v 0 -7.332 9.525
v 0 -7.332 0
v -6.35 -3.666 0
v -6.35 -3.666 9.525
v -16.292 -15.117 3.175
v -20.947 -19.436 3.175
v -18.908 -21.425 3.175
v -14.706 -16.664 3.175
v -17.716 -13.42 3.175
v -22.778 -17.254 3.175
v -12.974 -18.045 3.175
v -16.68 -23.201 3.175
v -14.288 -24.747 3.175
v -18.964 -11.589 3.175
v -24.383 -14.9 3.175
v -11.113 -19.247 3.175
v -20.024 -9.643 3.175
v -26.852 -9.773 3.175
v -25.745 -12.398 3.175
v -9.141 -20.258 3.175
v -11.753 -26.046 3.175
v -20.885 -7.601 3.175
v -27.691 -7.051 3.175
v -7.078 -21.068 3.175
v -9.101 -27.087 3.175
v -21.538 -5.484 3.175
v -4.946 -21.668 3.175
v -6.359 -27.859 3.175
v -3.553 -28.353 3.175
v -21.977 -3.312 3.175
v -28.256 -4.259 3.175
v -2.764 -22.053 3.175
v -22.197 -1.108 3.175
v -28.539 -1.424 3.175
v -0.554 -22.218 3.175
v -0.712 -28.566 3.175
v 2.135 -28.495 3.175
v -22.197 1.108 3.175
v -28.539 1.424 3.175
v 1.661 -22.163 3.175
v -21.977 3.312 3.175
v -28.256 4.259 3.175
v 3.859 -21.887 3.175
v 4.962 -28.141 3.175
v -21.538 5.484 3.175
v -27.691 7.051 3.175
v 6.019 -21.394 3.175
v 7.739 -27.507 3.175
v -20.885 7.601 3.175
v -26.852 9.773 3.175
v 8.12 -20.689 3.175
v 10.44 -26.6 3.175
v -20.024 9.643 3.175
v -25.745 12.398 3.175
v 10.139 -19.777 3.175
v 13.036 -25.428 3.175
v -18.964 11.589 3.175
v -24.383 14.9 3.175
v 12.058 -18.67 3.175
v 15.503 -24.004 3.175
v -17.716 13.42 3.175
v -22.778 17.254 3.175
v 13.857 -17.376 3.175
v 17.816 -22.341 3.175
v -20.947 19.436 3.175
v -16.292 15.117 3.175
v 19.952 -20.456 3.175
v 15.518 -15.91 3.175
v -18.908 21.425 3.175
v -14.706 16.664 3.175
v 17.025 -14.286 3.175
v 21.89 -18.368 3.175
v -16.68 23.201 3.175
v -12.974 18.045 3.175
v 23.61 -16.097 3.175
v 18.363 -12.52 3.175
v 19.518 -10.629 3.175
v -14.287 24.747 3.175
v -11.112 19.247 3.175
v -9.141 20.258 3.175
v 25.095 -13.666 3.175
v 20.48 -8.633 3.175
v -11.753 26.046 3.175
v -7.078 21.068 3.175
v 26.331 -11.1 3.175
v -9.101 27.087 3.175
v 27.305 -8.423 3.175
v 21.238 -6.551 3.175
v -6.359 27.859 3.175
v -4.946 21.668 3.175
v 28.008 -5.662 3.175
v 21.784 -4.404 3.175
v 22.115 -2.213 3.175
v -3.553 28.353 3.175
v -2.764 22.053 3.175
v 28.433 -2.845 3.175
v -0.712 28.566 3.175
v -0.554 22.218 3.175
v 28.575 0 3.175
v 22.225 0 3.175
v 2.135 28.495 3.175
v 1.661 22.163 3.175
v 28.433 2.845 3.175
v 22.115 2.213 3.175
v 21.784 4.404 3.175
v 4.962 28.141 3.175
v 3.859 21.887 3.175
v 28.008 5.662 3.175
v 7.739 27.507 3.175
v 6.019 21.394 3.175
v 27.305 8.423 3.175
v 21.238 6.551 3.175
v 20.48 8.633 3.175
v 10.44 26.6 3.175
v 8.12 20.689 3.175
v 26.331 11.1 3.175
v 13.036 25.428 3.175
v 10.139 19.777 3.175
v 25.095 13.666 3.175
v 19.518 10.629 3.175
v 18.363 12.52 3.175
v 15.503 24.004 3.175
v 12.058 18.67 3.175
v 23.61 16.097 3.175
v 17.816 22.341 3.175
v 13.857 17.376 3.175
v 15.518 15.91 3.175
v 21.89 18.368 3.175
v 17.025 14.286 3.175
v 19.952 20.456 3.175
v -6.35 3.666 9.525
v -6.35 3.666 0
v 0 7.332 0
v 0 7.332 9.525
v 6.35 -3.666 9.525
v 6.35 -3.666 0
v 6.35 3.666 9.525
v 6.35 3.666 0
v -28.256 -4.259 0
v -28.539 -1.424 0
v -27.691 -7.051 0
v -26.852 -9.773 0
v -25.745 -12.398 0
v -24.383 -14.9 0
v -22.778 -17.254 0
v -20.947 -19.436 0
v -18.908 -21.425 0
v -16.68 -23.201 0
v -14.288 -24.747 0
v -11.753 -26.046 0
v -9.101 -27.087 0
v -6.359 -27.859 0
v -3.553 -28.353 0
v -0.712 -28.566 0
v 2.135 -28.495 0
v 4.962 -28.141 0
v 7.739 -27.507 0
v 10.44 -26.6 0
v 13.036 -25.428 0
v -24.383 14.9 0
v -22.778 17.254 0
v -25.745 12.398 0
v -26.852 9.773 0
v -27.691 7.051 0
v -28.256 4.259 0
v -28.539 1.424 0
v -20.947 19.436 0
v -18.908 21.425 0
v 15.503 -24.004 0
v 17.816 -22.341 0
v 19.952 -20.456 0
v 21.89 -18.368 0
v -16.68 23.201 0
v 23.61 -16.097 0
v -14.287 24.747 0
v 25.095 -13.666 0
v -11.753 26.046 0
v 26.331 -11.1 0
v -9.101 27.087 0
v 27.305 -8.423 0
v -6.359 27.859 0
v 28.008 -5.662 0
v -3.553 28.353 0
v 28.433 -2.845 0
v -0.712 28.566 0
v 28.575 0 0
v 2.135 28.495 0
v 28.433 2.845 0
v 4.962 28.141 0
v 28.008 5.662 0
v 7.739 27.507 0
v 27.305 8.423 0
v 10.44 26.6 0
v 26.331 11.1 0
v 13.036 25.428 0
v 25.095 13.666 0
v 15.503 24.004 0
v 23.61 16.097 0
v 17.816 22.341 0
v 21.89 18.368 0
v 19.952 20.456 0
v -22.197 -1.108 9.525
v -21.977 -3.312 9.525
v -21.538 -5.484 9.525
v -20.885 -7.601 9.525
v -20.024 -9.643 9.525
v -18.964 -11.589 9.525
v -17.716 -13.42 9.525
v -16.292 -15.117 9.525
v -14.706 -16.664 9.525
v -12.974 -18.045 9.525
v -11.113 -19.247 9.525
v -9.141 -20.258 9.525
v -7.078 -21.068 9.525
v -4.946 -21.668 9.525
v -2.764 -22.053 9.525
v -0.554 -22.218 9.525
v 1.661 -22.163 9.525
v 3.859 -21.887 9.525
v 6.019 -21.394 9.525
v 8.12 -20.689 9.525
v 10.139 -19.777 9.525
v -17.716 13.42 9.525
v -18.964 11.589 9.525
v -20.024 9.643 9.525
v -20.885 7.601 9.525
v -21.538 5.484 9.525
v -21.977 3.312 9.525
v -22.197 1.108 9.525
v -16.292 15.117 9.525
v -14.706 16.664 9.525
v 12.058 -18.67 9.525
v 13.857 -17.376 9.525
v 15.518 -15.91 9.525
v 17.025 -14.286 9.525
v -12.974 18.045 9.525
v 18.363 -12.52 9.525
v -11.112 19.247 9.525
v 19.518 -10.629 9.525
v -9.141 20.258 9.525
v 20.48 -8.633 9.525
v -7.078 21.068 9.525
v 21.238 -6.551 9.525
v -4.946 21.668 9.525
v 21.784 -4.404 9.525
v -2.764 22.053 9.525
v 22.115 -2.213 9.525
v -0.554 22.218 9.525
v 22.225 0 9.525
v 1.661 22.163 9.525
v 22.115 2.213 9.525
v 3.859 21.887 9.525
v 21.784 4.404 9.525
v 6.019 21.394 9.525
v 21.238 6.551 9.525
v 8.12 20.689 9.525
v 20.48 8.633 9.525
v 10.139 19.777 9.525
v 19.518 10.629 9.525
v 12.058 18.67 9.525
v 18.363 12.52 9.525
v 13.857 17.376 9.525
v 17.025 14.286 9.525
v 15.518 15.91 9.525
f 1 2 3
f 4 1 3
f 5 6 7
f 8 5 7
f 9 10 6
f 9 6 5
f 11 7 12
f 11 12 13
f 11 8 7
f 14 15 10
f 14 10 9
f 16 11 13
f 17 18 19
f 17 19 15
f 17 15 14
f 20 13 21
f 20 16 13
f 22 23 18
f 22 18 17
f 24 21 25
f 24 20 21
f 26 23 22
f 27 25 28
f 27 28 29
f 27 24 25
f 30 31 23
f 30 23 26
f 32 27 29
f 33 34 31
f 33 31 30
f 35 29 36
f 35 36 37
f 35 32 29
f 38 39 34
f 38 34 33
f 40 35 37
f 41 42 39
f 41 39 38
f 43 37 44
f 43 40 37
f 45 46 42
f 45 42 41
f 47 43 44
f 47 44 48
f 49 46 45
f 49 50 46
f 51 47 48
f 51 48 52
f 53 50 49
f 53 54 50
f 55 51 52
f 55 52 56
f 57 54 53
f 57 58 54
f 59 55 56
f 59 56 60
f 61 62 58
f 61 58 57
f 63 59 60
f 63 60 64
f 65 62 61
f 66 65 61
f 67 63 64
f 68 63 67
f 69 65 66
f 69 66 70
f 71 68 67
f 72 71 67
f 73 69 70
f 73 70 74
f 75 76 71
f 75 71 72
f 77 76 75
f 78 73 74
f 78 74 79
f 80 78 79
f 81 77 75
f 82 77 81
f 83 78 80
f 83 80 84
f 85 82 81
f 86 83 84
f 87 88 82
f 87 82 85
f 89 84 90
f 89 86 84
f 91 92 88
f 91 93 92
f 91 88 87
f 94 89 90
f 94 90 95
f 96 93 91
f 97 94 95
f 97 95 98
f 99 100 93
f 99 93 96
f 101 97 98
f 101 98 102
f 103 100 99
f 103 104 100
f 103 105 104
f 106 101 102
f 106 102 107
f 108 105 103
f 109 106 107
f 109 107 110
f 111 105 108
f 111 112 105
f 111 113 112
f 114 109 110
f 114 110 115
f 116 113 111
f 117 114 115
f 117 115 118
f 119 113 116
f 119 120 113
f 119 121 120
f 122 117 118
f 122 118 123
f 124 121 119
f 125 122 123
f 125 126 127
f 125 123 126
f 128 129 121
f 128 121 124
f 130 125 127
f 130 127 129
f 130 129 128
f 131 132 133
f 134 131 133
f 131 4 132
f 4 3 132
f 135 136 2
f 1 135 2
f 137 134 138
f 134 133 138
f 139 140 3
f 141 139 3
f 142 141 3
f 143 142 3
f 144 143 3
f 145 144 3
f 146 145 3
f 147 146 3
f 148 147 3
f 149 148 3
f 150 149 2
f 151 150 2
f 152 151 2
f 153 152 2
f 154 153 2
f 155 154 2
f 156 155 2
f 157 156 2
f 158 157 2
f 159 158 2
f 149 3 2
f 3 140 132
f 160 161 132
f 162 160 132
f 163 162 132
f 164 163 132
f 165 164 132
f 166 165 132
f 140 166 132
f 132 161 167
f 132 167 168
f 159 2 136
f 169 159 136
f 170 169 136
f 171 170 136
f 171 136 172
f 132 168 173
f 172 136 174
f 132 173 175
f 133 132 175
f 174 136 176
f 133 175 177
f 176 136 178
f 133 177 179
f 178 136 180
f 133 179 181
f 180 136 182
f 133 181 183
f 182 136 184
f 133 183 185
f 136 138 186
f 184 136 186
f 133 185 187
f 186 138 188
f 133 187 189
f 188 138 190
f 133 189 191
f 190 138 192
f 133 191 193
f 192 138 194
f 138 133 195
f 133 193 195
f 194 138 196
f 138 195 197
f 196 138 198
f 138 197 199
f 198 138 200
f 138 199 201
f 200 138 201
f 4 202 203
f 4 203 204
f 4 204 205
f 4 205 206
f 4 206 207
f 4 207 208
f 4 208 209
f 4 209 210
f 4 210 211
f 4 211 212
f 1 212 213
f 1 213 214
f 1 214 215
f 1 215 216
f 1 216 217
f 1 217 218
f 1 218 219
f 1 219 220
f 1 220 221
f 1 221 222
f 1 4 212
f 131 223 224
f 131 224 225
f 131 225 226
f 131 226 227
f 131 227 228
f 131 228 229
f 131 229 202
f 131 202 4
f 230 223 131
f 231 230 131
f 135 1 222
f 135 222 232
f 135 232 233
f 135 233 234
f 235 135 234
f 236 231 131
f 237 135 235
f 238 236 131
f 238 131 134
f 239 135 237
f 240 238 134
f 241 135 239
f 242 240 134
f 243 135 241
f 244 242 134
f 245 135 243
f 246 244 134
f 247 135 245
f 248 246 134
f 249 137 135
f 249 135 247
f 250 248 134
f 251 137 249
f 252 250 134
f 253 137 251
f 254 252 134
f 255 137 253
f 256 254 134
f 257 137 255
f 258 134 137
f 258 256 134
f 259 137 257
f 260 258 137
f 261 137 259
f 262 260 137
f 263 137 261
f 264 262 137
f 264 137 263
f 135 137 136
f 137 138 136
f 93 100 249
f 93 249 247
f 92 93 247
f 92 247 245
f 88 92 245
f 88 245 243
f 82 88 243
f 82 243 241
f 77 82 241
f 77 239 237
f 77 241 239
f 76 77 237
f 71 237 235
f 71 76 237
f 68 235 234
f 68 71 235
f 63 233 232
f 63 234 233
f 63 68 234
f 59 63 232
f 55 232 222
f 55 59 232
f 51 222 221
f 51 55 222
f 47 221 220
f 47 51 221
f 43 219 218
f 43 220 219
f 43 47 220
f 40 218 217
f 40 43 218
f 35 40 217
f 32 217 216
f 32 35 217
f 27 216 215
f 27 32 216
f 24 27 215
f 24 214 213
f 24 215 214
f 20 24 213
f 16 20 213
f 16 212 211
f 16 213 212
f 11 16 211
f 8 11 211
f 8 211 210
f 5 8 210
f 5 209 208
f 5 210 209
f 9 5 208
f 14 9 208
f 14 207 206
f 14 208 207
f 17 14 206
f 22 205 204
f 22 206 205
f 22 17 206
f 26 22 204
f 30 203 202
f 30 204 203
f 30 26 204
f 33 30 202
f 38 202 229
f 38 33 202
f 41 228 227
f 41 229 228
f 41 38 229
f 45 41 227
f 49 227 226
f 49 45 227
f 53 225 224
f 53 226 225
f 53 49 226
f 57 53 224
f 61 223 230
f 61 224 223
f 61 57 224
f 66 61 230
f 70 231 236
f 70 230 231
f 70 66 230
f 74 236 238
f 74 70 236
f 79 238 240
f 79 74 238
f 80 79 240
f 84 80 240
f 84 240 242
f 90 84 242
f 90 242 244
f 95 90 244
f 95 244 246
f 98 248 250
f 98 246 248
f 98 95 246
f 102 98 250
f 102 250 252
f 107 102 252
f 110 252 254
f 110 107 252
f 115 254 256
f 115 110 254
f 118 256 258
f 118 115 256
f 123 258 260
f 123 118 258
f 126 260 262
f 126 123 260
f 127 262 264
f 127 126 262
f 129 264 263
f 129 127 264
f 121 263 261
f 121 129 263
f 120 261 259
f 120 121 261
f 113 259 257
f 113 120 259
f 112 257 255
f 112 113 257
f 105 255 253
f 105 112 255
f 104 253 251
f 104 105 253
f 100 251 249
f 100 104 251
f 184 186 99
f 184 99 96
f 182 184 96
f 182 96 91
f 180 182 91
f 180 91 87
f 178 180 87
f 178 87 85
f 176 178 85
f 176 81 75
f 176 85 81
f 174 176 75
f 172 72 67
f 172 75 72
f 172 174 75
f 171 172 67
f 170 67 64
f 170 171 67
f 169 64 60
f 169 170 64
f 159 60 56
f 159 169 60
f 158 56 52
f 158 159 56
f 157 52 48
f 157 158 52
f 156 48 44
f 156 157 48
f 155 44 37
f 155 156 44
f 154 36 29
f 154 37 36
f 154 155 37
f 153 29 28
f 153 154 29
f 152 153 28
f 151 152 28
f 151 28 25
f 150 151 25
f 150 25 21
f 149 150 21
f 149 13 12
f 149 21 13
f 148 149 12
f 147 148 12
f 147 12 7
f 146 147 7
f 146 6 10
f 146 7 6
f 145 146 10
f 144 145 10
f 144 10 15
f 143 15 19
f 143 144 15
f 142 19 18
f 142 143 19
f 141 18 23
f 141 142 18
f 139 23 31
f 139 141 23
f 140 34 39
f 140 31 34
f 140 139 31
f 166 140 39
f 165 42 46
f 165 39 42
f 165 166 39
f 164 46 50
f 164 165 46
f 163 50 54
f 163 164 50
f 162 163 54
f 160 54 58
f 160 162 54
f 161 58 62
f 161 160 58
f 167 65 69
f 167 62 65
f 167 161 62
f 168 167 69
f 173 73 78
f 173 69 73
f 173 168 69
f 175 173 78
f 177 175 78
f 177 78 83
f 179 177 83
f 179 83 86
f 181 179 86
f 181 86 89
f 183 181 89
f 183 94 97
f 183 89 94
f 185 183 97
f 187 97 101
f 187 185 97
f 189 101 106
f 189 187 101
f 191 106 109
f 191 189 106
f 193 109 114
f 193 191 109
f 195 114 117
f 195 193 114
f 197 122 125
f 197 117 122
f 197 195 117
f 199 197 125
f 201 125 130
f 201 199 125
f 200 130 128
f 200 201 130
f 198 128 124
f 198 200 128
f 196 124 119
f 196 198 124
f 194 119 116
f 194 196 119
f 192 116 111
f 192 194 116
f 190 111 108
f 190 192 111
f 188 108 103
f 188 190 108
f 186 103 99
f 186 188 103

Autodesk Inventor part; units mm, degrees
ref_plane "YZ Plane" through (0, 0, 0) normal (1, 0, 0) x (0, 1, 0)
ref_plane "XZ Plane" through (0, 0, 0) normal (0, 1, 0) x (-1, 0, 0)
ref_plane "XY Plane" through (0, 0, 0) normal (0, 0, 1) x (1, 0, 0)
sketch "Sketch1" plane through (0, 0, 0) normal (0, 0, 1) x (1, 0, 0)
  circle A0 centre (0, 0) radius 28.575
  line L0 (0, 7.3323) -> (6.35, 3.6662)
  line L1 (6.35, 3.6662) -> (6.35, -3.6662)
  line L2 (6.35, -3.6662) -> (0, -7.3323)
  line L3 (0, -7.3323) -> (-6.35, -3.6662)
  line L4 (-6.35, -3.6662) -> (-6.35, 3.6662)
  line L5 (-6.35, 3.6662) -> (0, 7.3323)
  dimension "d0" = 57.15
  dimension "d1" = 12.7
extrude "Extrusion1" add sketch "Sketch1" along normal blind 3.175
sketch "Sketch3" plane through (0, 0, 3.175) normal (0, 0, 1) x (1, 0, 0)
  line L0 (6.35, 3.6662) -> (6.35, -3.6662) projected
  line L1 (6.35, -3.6662) -> (0, -7.3323) projected
  line L2 (0, -7.3323) -> (-6.35, -3.6662) projected
  line L3 (-6.35, -3.6662) -> (-6.35, 3.6662) projected
  line L4 (-6.35, 3.6662) -> (0, 7.3323) projected
  line L5 (0, 7.3323) -> (6.35, 3.6662) projected
  circle A0 centre (0, 0) radius 28.575 projected
  circle A1 centre (0, 0) radius 22.225
  dimension "d8" = 44.45
extrude "Extrusion3" add sketch "Sketch3" along normal blind 6.35 contours A1
properties part number "Tube End Cap"
